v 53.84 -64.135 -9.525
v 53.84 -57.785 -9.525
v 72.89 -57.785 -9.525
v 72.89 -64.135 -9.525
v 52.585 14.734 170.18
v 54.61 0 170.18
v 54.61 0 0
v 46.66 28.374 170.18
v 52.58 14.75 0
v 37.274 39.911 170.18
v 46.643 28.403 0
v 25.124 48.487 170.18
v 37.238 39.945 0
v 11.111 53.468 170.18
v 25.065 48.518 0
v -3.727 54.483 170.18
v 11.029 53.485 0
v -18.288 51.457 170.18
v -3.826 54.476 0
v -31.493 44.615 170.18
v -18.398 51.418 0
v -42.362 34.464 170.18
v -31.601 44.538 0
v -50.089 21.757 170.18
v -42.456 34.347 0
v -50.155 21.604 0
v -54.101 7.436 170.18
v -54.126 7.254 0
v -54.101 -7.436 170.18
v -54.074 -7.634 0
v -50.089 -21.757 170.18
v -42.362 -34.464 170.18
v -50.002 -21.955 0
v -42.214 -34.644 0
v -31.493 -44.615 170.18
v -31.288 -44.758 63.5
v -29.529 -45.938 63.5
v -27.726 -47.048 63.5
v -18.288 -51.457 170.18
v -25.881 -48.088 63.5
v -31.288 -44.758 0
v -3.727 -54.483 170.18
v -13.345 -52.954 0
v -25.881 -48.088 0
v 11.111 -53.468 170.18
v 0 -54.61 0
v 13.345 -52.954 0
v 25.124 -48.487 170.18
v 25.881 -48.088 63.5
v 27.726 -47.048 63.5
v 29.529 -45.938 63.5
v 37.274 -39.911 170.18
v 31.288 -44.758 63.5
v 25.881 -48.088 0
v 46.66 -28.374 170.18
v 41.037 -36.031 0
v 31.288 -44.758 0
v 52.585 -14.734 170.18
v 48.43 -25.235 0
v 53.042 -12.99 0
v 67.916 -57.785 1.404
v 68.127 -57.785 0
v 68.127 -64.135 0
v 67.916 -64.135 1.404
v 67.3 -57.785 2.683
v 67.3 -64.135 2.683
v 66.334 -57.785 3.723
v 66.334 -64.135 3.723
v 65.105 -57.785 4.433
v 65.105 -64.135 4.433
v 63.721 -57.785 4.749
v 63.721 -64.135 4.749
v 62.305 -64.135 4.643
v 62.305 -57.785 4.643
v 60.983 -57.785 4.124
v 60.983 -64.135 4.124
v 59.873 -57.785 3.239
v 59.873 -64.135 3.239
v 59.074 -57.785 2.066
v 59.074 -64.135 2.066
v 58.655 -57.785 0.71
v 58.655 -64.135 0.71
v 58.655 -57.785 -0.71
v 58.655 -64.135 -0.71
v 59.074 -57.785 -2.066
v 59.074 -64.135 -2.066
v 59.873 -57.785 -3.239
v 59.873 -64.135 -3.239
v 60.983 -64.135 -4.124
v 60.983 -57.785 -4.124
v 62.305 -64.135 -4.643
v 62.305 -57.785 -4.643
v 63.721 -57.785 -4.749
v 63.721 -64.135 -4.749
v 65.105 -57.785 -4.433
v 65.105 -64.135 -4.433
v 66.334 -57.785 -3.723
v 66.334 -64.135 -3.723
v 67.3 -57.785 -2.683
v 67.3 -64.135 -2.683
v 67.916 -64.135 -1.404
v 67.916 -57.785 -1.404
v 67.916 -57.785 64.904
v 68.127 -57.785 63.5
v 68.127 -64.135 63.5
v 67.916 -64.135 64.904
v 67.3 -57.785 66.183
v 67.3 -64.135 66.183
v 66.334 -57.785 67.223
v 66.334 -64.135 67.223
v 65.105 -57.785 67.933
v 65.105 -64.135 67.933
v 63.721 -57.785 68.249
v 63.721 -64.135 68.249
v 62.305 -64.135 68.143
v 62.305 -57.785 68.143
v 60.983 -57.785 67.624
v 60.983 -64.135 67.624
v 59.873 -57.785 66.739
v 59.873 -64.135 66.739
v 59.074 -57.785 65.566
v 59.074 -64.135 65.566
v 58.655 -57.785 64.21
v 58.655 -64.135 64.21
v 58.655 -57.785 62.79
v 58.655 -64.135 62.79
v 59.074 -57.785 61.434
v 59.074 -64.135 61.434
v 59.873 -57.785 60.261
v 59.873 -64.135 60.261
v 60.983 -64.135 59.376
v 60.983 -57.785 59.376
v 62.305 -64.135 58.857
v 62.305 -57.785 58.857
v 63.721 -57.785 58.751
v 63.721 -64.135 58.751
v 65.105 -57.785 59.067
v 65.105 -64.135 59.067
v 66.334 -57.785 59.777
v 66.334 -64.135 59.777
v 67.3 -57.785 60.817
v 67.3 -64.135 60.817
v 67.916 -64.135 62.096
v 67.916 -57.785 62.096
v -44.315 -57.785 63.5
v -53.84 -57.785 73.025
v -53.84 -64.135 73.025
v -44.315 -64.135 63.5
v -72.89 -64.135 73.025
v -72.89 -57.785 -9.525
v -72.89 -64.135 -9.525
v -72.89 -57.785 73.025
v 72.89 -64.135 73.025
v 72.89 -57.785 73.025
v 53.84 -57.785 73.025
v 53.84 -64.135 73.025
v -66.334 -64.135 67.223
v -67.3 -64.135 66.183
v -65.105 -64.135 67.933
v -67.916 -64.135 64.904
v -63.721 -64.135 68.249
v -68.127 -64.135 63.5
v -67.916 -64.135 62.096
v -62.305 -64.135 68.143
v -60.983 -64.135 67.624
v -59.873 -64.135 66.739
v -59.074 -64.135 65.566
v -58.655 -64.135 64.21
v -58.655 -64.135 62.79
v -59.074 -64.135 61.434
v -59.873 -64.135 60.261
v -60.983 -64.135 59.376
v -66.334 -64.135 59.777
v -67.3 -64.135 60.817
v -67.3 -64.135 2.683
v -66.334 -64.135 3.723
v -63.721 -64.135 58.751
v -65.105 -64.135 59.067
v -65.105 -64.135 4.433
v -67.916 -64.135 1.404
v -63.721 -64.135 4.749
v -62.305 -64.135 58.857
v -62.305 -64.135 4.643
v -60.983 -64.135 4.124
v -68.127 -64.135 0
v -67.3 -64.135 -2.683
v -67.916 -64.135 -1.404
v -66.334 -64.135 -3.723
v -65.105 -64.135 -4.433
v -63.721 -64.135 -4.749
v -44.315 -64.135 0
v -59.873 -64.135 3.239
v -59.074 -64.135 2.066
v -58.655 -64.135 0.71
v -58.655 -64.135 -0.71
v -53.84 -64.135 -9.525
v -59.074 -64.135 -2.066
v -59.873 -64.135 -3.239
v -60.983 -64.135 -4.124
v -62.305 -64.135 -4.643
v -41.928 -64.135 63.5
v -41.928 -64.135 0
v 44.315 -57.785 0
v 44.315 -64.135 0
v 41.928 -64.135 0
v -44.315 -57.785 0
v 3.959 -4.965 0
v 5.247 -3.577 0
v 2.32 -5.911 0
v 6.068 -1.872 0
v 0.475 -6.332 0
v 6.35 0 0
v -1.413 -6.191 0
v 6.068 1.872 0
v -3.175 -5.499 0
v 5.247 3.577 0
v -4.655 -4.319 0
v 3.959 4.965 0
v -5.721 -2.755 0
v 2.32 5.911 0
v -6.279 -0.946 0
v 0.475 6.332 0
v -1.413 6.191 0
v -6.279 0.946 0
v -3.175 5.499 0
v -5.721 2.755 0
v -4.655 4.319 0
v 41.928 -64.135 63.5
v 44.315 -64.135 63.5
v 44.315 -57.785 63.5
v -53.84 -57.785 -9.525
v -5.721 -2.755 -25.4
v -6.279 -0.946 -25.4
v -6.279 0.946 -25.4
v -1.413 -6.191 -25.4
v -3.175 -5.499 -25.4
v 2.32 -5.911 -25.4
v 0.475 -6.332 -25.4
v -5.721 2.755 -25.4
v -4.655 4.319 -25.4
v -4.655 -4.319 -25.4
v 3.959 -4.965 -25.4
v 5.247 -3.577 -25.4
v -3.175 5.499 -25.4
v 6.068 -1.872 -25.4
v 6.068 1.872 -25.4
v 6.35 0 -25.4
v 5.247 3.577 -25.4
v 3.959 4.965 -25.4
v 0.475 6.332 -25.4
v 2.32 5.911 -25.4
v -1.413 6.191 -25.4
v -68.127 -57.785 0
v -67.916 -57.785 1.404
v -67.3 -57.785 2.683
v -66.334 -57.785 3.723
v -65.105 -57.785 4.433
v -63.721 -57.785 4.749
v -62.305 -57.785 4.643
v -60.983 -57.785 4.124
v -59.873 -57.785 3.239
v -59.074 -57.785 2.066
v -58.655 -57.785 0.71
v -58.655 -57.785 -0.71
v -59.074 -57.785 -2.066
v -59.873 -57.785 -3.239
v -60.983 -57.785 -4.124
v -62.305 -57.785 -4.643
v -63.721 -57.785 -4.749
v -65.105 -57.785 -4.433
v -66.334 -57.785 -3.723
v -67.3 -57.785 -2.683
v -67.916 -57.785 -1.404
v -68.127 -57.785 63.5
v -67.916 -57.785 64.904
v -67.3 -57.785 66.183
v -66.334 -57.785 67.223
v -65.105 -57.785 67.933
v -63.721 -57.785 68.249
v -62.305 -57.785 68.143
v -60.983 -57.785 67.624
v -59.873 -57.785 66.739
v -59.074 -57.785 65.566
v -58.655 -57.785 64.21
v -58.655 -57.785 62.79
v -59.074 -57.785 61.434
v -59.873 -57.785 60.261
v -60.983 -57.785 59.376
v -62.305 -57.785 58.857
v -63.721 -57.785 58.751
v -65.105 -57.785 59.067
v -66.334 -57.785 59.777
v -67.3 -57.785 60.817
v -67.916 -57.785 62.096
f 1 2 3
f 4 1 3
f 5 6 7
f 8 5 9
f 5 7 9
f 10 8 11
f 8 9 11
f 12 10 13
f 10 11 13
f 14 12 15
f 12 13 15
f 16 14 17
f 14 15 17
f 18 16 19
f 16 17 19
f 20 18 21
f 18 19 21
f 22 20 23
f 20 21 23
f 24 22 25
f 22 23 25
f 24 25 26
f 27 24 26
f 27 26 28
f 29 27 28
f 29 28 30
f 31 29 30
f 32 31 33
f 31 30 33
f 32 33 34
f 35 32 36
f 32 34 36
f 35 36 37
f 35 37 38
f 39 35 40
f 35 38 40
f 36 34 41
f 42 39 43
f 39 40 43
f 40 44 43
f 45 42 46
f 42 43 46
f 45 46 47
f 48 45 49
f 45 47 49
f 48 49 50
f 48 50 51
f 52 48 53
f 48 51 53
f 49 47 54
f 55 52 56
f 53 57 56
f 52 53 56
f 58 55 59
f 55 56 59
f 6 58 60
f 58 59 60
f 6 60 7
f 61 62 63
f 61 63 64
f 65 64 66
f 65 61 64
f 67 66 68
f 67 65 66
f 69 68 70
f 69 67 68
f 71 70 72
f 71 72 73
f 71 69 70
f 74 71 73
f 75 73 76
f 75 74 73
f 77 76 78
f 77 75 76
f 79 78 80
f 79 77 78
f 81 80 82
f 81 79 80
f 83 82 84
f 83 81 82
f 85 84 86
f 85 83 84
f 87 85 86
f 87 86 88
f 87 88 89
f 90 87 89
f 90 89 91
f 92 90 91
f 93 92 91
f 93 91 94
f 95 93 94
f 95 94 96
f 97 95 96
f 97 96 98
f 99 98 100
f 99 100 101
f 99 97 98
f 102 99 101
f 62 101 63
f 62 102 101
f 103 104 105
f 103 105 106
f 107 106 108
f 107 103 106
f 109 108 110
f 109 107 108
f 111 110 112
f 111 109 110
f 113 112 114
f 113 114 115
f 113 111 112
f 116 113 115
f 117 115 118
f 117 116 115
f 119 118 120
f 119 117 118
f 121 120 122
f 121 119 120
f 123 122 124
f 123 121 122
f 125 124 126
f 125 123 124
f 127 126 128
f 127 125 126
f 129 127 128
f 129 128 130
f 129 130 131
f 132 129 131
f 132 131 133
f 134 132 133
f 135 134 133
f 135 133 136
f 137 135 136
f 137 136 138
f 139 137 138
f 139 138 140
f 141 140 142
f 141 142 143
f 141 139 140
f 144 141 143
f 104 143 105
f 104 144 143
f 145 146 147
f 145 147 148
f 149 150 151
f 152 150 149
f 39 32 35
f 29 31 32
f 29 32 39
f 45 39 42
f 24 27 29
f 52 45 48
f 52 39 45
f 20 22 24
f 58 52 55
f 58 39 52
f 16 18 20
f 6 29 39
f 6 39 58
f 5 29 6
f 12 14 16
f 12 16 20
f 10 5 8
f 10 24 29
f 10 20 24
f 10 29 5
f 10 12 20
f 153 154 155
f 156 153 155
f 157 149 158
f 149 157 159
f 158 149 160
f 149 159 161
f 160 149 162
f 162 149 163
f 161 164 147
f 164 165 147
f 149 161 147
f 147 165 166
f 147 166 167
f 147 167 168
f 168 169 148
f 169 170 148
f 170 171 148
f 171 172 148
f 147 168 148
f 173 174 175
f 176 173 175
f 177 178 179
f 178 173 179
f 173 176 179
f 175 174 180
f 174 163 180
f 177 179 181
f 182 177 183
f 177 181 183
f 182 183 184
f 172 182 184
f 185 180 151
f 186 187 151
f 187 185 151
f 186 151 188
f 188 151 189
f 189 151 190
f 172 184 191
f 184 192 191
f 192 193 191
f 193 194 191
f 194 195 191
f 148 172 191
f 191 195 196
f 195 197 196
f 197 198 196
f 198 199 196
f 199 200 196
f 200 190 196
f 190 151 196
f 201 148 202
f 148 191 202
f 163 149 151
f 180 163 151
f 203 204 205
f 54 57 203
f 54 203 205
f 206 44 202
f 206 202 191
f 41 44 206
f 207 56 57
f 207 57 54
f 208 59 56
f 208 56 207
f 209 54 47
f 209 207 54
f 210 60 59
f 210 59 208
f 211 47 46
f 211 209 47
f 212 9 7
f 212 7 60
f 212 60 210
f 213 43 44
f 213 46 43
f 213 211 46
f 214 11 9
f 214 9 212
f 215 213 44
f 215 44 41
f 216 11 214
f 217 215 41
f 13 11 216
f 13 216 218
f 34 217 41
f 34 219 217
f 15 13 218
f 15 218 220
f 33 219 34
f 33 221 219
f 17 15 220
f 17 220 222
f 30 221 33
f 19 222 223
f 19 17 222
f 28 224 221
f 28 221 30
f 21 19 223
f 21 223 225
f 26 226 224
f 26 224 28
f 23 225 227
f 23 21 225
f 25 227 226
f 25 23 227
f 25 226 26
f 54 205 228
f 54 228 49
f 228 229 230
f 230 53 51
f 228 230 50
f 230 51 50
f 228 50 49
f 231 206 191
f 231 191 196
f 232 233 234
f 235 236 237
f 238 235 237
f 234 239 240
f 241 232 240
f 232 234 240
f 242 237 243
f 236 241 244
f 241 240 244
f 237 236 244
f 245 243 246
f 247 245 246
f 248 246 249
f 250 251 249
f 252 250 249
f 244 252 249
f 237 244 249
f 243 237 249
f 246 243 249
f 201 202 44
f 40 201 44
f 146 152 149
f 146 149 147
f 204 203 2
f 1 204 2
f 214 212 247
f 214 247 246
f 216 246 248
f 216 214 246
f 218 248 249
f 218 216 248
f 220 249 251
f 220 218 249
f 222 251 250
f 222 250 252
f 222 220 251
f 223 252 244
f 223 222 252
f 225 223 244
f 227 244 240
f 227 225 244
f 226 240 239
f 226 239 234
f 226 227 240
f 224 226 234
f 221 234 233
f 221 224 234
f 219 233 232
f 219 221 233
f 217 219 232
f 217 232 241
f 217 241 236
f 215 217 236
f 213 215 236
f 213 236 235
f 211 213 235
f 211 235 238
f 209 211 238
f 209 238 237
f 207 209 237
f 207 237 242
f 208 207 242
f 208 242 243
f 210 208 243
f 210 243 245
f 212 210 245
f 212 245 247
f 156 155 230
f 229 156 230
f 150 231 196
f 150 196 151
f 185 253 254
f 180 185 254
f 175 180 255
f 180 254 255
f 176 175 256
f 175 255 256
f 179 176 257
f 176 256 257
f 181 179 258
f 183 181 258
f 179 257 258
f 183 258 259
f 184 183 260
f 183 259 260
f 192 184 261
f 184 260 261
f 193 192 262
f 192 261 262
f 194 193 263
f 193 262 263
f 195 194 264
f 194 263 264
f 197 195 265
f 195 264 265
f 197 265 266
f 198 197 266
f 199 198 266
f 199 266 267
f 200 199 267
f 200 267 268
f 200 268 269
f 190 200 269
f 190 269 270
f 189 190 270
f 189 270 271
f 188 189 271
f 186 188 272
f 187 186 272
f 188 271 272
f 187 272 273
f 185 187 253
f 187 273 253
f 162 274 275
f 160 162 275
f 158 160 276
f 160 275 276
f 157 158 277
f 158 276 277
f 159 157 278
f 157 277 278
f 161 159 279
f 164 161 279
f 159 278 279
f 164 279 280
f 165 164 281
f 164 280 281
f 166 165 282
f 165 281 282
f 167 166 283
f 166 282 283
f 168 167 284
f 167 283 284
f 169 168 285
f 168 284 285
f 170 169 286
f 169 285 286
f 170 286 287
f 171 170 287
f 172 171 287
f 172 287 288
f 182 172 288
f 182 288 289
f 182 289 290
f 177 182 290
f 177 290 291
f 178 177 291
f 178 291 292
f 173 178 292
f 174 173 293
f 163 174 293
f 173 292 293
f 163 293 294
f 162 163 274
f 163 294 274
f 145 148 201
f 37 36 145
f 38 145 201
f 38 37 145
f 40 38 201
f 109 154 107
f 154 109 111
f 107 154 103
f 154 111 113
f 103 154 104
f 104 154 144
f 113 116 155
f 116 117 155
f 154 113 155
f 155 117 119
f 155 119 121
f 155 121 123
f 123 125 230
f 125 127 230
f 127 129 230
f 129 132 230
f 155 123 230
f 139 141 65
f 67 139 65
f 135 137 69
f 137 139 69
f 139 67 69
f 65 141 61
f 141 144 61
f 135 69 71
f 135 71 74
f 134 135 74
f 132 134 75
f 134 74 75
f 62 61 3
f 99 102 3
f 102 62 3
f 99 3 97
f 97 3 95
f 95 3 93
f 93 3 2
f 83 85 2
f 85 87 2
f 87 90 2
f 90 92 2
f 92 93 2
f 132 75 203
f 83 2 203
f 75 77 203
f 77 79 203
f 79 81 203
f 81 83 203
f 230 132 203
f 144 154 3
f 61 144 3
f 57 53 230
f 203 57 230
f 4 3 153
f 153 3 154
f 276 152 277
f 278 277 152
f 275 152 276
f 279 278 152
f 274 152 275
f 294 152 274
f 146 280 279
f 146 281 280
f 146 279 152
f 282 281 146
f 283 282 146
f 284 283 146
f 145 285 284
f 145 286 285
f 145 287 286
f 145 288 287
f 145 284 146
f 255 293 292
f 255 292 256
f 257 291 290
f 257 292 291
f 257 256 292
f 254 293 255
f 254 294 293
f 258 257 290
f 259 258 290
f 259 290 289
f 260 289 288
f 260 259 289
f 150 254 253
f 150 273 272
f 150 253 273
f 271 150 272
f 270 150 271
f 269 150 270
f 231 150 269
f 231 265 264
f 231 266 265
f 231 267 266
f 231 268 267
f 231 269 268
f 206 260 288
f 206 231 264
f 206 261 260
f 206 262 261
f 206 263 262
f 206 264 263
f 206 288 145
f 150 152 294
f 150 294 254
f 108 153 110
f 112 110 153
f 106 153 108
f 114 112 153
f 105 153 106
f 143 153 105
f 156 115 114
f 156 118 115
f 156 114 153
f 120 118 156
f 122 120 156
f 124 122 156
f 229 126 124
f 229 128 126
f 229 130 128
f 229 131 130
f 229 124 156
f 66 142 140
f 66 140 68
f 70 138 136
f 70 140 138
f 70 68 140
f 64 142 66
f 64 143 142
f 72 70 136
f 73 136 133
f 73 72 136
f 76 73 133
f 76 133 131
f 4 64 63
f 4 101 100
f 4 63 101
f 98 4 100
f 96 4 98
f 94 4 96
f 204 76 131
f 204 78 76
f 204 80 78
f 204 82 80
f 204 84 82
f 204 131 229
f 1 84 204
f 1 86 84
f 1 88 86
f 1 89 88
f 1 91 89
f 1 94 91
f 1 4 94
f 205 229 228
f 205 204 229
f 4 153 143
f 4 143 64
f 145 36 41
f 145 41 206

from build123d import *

# Parameters (mm, degrees)
SKETCH1_R           = 54.61
BOSS_EXTRUDE1_DEPTH = 170.18
BOSS_EXTRUDE2_START = -170.18
SKETCH2_R           = 6.35
BOSS_EXTRUDE2_DEPTH = 25.4
BOSS_EXTRUDE3_DEPTH = 63.5
SKETCH4_R           = 4.7625
SKETCH4_W           = 3.175
SKETCH4_H           = 63.5
BOSS_EXTRUDE4_DEPTH = 6.35


with BuildPart() as part:
    # Sketch1 → Boss-Extrude1 (new body)
    with BuildSketch(Plane.XY):
        Circle(SKETCH1_R)
    extrude(amount=BOSS_EXTRUDE1_DEPTH)

    # Sketch2 → Boss-Extrude2 (add)
    with BuildSketch(Plane.XY.offset(170.18).offset(BOSS_EXTRUDE2_START)):
        Circle(SKETCH2_R)
    extrude(amount=-BOSS_EXTRUDE2_DEPTH)

    # Sketch3 → Boss-Extrude3 (add)
    with BuildSketch(Plane.XY):
        with BuildLine():
            Line((-31.288001325, -44.758385506), (-44.314615818, -57.785))
            Line((-44.314615818, -57.785), (-47.489615818, -57.785))
            Line((-47.489615818, -57.785), (-47.489615818, -64.135))
            Line((-47.489615818, -64.135), (-41.928035591, -64.135))
            Line((-41.928035591, -64.135), (-25.880821668, -48.087786077))
            ThreePointArc((-25.880821668, -48.087786077), (-28.63284491, -46.501745047), (-31.288001325, -44.758385506))
        make_face()
    extrude(amount=BOSS_EXTRUDE3_DEPTH)

    # Sketch4 → Boss-Extrude4 (add)
    # profile 1 of 2: a face of its own
    with BuildSketch(Plane(origin=(0, -57.785, 0), x_dir=(1, 0, 0), z_dir=(0, 1, 0))):
        Polygon((-72.889615818, -73.025), (-53.839615818, -73.025), (-44.314615818, -63.5), (-47.489615818, -63.5), (-47.489615818, 0), (-44.314615818, 0), (-53.839615818, 9.525), (-72.889615818, 9.525), align=None)
        with Locations(Location((-63.364615818, -63.5, 0), (0, 0, 180))):
            Circle(SKETCH4_R, mode=Mode.SUBTRACT)
        with Locations(Location((-63.364615818, 0, 0), (0, 0, 180))):
            Circle(SKETCH4_R, mode=Mode.SUBTRACT)
    # profile 2 of 2: a face of its own
    with BuildSketch(Plane(origin=(0, -57.785, 0), x_dir=(1, 0, 0), z_dir=(0, 1, 0))):
        with Locations((-45.902115818, -31.75)):
            Rectangle(SKETCH4_W, SKETCH4_H)
    extrude(amount=-BOSS_EXTRUDE4_DEPTH)

    # Mirror1: part across plane


with BuildPart() as part_1:
    add(part.part)
    add(part.part.mirror(Plane(origin=(0, 0, 0), x_dir=(0, 0, 1), z_dir=(1, 0, 0))))


solid = part_1.part
